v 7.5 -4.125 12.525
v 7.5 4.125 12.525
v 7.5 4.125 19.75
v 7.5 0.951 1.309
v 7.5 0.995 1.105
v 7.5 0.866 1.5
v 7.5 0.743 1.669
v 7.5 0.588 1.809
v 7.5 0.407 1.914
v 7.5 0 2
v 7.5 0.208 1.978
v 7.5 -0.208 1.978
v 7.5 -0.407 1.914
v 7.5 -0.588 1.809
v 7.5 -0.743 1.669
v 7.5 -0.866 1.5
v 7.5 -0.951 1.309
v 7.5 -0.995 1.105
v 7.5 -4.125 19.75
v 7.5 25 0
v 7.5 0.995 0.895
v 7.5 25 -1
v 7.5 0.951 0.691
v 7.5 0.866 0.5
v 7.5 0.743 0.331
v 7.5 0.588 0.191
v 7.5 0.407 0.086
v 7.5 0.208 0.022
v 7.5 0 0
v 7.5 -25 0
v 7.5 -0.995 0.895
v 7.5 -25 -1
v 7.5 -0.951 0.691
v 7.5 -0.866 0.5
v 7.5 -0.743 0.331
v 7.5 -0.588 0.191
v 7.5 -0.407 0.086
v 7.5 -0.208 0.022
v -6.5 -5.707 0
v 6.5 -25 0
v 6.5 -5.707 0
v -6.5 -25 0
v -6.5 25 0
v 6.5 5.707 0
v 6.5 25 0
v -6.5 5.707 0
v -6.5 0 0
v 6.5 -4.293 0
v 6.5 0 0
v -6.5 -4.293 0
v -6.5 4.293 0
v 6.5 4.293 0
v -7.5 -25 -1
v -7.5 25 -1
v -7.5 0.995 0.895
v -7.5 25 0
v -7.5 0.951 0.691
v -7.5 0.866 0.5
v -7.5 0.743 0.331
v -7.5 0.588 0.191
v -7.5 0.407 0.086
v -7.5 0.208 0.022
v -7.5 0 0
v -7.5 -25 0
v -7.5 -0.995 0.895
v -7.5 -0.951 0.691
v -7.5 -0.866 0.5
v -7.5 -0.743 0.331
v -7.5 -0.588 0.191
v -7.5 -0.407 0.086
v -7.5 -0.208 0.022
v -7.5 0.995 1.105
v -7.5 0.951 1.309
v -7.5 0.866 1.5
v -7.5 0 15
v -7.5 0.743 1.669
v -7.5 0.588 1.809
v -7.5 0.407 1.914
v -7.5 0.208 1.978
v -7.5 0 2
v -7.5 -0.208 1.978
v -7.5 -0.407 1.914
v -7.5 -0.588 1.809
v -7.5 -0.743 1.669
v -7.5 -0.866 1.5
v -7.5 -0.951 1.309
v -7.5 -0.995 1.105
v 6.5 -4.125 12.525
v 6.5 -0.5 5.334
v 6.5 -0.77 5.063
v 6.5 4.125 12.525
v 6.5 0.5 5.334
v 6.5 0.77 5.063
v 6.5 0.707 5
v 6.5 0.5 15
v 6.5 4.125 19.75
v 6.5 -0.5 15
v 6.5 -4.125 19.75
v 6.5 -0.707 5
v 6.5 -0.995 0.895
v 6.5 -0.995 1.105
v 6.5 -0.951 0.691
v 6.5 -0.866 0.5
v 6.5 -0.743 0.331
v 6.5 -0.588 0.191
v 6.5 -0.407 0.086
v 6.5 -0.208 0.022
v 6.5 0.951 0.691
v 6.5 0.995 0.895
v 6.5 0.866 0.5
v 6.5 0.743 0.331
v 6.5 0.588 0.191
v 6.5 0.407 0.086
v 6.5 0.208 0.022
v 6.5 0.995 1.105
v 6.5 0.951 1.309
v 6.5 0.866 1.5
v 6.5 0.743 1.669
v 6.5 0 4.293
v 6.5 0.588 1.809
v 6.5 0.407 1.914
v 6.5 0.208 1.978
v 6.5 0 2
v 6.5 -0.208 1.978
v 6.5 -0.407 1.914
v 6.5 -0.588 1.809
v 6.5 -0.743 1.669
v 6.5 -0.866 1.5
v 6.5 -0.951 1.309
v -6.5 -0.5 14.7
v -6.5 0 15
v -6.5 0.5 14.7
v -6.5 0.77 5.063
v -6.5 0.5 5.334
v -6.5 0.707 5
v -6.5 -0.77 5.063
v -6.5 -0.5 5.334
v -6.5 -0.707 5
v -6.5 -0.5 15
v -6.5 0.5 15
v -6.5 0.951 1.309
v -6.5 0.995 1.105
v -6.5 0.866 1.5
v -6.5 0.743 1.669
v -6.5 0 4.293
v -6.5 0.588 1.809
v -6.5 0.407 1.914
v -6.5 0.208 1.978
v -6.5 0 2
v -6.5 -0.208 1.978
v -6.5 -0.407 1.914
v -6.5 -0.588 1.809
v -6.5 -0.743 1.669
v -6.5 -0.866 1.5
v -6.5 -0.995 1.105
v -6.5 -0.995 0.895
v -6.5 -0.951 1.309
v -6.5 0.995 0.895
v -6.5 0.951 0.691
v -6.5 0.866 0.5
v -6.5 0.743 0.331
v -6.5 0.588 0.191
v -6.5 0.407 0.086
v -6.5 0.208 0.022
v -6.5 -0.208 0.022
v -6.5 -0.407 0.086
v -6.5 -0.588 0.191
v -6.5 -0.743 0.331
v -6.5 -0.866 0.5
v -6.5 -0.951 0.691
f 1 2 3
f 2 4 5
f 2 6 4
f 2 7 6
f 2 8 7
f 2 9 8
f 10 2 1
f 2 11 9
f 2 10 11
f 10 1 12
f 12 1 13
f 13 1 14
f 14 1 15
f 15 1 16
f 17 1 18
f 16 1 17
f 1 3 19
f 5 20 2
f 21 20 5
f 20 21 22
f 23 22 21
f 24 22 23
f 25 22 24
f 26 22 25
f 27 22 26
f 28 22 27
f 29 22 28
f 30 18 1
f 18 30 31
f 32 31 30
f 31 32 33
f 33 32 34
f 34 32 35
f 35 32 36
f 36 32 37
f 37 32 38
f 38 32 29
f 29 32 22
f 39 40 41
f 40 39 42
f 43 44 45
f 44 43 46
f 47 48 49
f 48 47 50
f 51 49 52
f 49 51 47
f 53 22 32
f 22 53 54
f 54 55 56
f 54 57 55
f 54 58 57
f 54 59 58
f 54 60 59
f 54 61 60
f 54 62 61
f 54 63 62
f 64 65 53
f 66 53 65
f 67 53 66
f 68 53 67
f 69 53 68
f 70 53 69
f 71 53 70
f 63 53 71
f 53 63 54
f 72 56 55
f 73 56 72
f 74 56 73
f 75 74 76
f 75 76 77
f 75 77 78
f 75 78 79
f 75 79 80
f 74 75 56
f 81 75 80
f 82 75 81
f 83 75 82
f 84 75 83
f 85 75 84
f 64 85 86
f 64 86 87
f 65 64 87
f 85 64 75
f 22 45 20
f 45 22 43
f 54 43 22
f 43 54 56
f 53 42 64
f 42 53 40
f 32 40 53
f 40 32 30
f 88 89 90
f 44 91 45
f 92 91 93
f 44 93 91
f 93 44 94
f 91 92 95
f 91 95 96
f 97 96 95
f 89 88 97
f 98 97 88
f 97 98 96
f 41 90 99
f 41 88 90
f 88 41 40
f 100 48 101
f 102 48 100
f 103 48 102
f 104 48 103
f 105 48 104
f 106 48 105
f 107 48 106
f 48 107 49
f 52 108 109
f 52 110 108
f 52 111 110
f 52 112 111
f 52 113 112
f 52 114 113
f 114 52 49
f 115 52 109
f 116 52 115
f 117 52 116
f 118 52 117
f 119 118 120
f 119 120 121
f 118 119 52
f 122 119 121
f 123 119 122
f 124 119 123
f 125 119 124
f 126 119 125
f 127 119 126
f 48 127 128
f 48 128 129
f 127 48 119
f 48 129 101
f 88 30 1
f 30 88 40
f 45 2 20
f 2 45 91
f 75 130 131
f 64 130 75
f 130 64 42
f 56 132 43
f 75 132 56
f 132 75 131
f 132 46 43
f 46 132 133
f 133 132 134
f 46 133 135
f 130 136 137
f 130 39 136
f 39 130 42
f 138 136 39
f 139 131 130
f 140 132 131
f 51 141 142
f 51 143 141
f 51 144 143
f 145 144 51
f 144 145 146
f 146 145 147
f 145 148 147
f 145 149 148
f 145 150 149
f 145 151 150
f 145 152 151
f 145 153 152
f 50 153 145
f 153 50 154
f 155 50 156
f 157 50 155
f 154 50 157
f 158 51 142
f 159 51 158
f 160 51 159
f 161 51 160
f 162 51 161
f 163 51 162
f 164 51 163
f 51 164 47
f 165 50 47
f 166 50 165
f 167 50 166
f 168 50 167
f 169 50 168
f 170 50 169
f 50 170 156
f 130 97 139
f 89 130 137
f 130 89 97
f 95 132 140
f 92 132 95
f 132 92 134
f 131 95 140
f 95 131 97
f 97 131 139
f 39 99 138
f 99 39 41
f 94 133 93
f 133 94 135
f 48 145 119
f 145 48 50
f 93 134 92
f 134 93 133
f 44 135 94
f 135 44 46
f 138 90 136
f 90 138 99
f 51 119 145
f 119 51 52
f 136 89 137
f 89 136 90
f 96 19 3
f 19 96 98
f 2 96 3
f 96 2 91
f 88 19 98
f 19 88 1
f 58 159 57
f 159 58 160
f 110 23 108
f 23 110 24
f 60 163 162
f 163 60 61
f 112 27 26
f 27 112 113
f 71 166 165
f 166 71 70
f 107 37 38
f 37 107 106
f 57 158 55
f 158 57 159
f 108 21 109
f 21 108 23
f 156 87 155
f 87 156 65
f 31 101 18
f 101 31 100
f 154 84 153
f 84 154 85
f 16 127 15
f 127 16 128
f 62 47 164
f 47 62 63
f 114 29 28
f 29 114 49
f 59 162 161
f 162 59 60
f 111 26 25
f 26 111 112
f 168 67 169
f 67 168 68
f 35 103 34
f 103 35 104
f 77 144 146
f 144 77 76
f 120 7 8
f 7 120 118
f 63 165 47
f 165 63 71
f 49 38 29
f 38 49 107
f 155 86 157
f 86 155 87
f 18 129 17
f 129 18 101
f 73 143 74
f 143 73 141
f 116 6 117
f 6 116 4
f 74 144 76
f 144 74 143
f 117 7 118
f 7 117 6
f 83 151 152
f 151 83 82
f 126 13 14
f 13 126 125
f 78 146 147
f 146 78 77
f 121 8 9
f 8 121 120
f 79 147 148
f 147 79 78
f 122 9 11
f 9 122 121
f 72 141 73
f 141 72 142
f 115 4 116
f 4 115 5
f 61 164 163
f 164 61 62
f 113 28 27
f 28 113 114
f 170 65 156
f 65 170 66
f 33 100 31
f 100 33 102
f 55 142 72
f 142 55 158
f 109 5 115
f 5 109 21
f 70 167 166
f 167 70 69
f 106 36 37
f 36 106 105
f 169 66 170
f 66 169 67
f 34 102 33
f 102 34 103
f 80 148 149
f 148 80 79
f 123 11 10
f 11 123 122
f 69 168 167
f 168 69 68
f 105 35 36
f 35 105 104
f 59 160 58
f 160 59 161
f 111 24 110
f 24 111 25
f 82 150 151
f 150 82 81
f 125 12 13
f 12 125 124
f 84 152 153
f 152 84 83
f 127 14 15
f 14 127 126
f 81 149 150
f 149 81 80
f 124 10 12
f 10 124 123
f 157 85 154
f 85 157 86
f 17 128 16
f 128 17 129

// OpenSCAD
// file: triangles.scad
/*
Triangles.scad
 Author: Tim Koopman
 https://github.com/tkoopman/Delta-Diamond/blob/master/OpenSCAD/Triangles.scad

         angleCA
           /|\
        a / H \ c
         /  |  \
 angleAB ------- angleBC
            b

Standard Parameters
	center: true/false
		If true same as centerXYZ = [true, true, true]

	centerXYZ: Vector of 3 true/false values [CenterX, CenterY, CenterZ]
		center must be left undef

	height: The 3D height of the Triangle. Ignored if heights defined

	heights: Vector of 3 height values heights @ [angleAB, angleBC, angleCA]
		If CenterZ is true each height will be centered individually, this means
		the shape will be different depending on CenterZ. Most times you will want
		CenterZ to be true to get the shape most people want.
*/

/* 
Triangle
	a: Length of side a
	b: Length of side b
	angle: angle at point angleAB
*/
module Triangle(
			a, b, angle, height=1, heights=undef,
			center=undef, centerXYZ=[false,false,false])
{
	// Calculate Heights at each point
	heightAB = ((heights==undef) ? height : heights[0])/2;
	heightBC = ((heights==undef) ? height : heights[1])/2;
	heightCA = ((heights==undef) ? height : heights[2])/2;
	centerZ = (center || (center==undef && centerXYZ[2]))?0:max(heightAB,heightBC,heightCA);

	// Calculate Offsets for centering
	offsetX = (center || (center==undef && centerXYZ[0]))?((cos(angle)*a)+b)/3:0;
	offsetY = (center || (center==undef && centerXYZ[1]))?(sin(angle)*a)/3:0;
	
	pointAB1 = [-offsetX,-offsetY, centerZ-heightAB];
	pointAB2 = [-offsetX,-offsetY, centerZ+heightAB];
	pointBC1 = [b-offsetX,-offsetY, centerZ-heightBC];
	pointBC2 = [b-offsetX,-offsetY, centerZ+heightBC];
	pointCA1 = [(cos(angle)*a)-offsetX,(sin(angle)*a)-offsetY, centerZ-heightCA];
	pointCA2 = [(cos(angle)*a)-offsetX,(sin(angle)*a)-offsetY, centerZ+heightCA];

	polyhedron(
		points=[	pointAB1, pointBC1, pointCA1,
					pointAB2, pointBC2, pointCA2 ],
		triangles=[	
			[0, 1, 2],
			[3, 5, 4],
			[0, 3, 1],
			[1, 3, 4],
			[1, 4, 2],
			[2, 4, 5],
			[2, 5, 0],
			[0, 5, 3] ] );
}

/*
Isosceles Triangle
	Exactly 2 of the following paramaters must be defined.
	If all 3 defined H will be ignored.
	b: length of side b
	angle: angle at points angleAB & angleBC.
*/
module Isosceles_Triangle(
			b, angle, H=undef, height=1, heights=undef,
			center=undef, centerXYZ=[true, false, false])
{
	valid = 	(angle!=undef)?((angle < 90) && (b!=undef||H!=undef)) : (b!=undef&&H!=undef);
	ANGLE = (angle!=undef) ? angle : atan(H / (b/2));
	a = (b==undef)?(H/sin((180-(angle*2))/2)) : 
		 (b / cos(ANGLE))/2;
	B = (b==undef)? (cos(angle)*a)*2:b;
	if (valid)
	{
		Triangle(a=a, b=B, angle=ANGLE, height=height, heights=heights,
					center=center, centerXYZ=centerXYZ);
	} else {
		echo("Invalid Isosceles_Triangle. Must specify any 2 of b, angle and H, and if angle used angle must be less than 90");
	}
}

/*
Right Angled Triangle
	Create a Right Angled Triangle where the hypotenuse will be calculated.

       |\
      a| \
       |  \
       ----
         b
	a: length of side a
	b: length of side b
*/
module Right_Angled_Triangle(
			a, b, height=1, heights=undef,
			center=undef, centerXYZ=[false, false, false])
{
	Triangle(a=a, b=b, angle=90, height=height, heights=heights,
				center=center, centerXYZ=centerXYZ);
}

/*
Wedge
	Is same as Right Angled Triangle with 2 different heights, and rotated.
	Good for creating support structures.
*/
module Wedge(a, b, w1, w2)
{
	rotate([90,0,0])
		Right_Angled_Triangle(a, b, heights=[w1, w2, w1], centerXYZ=[false, false, true]);
}

/*
Equilateral Triangle
	Create a Equilateral Triangle.

	l: Length of all sides (a, b & c)
	H: Triangle size will be based on the this 2D height
		When using H, l is ignored.
*/
module Equilateral_Triangle(
			l=10, H=undef, height=1, heights=undef,
			center=undef, centerXYZ=[true,false,false])
{
	L = (H==undef)?l:H/sin(60);
	Triangle(a=L,b=L,angle=60,height=height, heights=heights,
				center=center, centerXYZ=centerXYZ);
}

/*
Trapezoid
	Create a Basic Trapezoid (Based on Isosceles_Triangle)

            d
          /----\
         /  |   \
     a  /   H    \ c
       /    |     \
 angle ------------ angle
            b

	b: Length of side b
	angle: Angle at points angleAB & angleBC
	H: The 2D height at which the triangle should be cut to create the trapezoid
	heights: If vector of size 3 (Standard for triangles) both cd & da will be the same height, if vector have 4 values [ab,bc,cd,da] than each point can have different heights.
*/
module Trapezoid(
			b, angle=60, H, height=1, heights=undef,
			center=undef, centerXYZ=[true,false,false])
{
	validAngle = (angle < 90);
	adX = H / tan(angle);

	// Calculate Heights at each point
	heightAB = ((heights==undef) ? height : heights[0])/2;
	heightBC = ((heights==undef) ? height : heights[1])/2;
	heightCD = ((heights==undef) ? height : heights[2])/2;
	heightDA = ((heights==undef) ? height : ((len(heights) > 3)?heights[3]:heights[2]))/2;

	// Centers
	centerX = (center || (center==undef && centerXYZ[0]))?0:b/2;
	centerY = (center || (center==undef && centerXYZ[1]))?0:H/2;
	centerZ = (center || (center==undef && centerXYZ[2]))?0:max(heightAB,heightBC,heightCD,heightDA);

	// Points
	y = H/2;
	bx = b/2;
	dx = (b-(adX*2))/2;

	pointAB1 = [centerX-bx, centerY-y, centerZ-heightAB];
	pointAB2 = [centerX-bx, centerY-y, centerZ+heightAB];
	pointBC1 = [centerX+bx, centerY-y, centerZ-heightBC];
	pointBC2 = [centerX+bx, centerY-y, centerZ+heightBC];
	pointCD1 = [centerX+dx, centerY+y, centerZ-heightCD];
	pointCD2 = [centerX+dx, centerY+y, centerZ+heightCD];
	pointDA1 = [centerX-dx, centerY+y, centerZ-heightDA];
	pointDA2 = [centerX-dx, centerY+y, centerZ+heightDA];

	validH = (adX < b/2);

	if (validAngle && validH)
	{
		polyhedron(
			points=[	pointAB1, pointBC1, pointCD1, pointDA1,
						pointAB2, pointBC2, pointCD2, pointDA2 ],
			triangles=[	
				[0, 1, 2],
				[0, 2, 3],
				[4, 6, 5],
				[4, 7, 6],
				[0, 4, 1],
				[1, 4, 5],
				[1, 5, 2],
				[2, 5, 6],
				[2, 6, 3],
				[3, 6, 7],
				[3, 7, 0],
				[0, 7, 4]	] );
	} else {
		if (!validAngle) echo("Trapezoid invalid, angle must be less than 90");
		else echo("Trapezoid invalid, H is larger than triangle");
	}
}
// main file
use<triangles.scad>

$fn = 30;

module bucket(length, width, height)
{
	difference() {
		union() {
			translate([-width/2, -length/2, -1]) cube([width,length,1]);
			translate([width/2-1, 0, 0])  rotate(a=90, v=[0,1 ,0 ]) rotate(a=90, v=[0,0 ,1 ]) Isosceles_Triangle(b=length, H=height);
			translate([-width/2, 0, 0])  rotate(a=90, v=[0,1 ,0 ]) rotate(a=90, v=[0,0 ,1 ]) Isosceles_Triangle(b=length, H=height);

			// vertical schot
			color("blue") translate([0, 0, height-5]) rotate(a=90,v=[1,0,0]) cube([width-2,height-5,1],center = true);

			// inside angles
			color("green") translate([0, -2.5, 2.5]) rotate(a=45,v=[1,0,0]) cube([width-2,length/8+2,1],center = true);
			color("green") translate([0, 2.5, 2.5]) rotate(a=-45,v=[1,0,0]) cube([width-2,length/8+2,1],center = true);

			// sensor arm
			color("green") translate([width/2-0.5, 0, height]) rotate(a=90,v=[0,1,0]) cube([width/2+2,length/8+2,1],center = true);

			//color("blue") translate([0, 0, 0]) rotate(a=90, v=[0,1 ,0 ]) cylinder(h=width, r=3, center=true);

		}
	// remove bottom parts
	color("red") translate([0, 0, -3]) cube([width+2,length+2,4], center = true);
	// whole for shaft
	color("red") translate([0, 0, 1]) rotate(a=90, v=[0,1 ,0 ]) cylinder(h=width+2, r=1, center=true);
	}
}

bucket(50,15,15);
